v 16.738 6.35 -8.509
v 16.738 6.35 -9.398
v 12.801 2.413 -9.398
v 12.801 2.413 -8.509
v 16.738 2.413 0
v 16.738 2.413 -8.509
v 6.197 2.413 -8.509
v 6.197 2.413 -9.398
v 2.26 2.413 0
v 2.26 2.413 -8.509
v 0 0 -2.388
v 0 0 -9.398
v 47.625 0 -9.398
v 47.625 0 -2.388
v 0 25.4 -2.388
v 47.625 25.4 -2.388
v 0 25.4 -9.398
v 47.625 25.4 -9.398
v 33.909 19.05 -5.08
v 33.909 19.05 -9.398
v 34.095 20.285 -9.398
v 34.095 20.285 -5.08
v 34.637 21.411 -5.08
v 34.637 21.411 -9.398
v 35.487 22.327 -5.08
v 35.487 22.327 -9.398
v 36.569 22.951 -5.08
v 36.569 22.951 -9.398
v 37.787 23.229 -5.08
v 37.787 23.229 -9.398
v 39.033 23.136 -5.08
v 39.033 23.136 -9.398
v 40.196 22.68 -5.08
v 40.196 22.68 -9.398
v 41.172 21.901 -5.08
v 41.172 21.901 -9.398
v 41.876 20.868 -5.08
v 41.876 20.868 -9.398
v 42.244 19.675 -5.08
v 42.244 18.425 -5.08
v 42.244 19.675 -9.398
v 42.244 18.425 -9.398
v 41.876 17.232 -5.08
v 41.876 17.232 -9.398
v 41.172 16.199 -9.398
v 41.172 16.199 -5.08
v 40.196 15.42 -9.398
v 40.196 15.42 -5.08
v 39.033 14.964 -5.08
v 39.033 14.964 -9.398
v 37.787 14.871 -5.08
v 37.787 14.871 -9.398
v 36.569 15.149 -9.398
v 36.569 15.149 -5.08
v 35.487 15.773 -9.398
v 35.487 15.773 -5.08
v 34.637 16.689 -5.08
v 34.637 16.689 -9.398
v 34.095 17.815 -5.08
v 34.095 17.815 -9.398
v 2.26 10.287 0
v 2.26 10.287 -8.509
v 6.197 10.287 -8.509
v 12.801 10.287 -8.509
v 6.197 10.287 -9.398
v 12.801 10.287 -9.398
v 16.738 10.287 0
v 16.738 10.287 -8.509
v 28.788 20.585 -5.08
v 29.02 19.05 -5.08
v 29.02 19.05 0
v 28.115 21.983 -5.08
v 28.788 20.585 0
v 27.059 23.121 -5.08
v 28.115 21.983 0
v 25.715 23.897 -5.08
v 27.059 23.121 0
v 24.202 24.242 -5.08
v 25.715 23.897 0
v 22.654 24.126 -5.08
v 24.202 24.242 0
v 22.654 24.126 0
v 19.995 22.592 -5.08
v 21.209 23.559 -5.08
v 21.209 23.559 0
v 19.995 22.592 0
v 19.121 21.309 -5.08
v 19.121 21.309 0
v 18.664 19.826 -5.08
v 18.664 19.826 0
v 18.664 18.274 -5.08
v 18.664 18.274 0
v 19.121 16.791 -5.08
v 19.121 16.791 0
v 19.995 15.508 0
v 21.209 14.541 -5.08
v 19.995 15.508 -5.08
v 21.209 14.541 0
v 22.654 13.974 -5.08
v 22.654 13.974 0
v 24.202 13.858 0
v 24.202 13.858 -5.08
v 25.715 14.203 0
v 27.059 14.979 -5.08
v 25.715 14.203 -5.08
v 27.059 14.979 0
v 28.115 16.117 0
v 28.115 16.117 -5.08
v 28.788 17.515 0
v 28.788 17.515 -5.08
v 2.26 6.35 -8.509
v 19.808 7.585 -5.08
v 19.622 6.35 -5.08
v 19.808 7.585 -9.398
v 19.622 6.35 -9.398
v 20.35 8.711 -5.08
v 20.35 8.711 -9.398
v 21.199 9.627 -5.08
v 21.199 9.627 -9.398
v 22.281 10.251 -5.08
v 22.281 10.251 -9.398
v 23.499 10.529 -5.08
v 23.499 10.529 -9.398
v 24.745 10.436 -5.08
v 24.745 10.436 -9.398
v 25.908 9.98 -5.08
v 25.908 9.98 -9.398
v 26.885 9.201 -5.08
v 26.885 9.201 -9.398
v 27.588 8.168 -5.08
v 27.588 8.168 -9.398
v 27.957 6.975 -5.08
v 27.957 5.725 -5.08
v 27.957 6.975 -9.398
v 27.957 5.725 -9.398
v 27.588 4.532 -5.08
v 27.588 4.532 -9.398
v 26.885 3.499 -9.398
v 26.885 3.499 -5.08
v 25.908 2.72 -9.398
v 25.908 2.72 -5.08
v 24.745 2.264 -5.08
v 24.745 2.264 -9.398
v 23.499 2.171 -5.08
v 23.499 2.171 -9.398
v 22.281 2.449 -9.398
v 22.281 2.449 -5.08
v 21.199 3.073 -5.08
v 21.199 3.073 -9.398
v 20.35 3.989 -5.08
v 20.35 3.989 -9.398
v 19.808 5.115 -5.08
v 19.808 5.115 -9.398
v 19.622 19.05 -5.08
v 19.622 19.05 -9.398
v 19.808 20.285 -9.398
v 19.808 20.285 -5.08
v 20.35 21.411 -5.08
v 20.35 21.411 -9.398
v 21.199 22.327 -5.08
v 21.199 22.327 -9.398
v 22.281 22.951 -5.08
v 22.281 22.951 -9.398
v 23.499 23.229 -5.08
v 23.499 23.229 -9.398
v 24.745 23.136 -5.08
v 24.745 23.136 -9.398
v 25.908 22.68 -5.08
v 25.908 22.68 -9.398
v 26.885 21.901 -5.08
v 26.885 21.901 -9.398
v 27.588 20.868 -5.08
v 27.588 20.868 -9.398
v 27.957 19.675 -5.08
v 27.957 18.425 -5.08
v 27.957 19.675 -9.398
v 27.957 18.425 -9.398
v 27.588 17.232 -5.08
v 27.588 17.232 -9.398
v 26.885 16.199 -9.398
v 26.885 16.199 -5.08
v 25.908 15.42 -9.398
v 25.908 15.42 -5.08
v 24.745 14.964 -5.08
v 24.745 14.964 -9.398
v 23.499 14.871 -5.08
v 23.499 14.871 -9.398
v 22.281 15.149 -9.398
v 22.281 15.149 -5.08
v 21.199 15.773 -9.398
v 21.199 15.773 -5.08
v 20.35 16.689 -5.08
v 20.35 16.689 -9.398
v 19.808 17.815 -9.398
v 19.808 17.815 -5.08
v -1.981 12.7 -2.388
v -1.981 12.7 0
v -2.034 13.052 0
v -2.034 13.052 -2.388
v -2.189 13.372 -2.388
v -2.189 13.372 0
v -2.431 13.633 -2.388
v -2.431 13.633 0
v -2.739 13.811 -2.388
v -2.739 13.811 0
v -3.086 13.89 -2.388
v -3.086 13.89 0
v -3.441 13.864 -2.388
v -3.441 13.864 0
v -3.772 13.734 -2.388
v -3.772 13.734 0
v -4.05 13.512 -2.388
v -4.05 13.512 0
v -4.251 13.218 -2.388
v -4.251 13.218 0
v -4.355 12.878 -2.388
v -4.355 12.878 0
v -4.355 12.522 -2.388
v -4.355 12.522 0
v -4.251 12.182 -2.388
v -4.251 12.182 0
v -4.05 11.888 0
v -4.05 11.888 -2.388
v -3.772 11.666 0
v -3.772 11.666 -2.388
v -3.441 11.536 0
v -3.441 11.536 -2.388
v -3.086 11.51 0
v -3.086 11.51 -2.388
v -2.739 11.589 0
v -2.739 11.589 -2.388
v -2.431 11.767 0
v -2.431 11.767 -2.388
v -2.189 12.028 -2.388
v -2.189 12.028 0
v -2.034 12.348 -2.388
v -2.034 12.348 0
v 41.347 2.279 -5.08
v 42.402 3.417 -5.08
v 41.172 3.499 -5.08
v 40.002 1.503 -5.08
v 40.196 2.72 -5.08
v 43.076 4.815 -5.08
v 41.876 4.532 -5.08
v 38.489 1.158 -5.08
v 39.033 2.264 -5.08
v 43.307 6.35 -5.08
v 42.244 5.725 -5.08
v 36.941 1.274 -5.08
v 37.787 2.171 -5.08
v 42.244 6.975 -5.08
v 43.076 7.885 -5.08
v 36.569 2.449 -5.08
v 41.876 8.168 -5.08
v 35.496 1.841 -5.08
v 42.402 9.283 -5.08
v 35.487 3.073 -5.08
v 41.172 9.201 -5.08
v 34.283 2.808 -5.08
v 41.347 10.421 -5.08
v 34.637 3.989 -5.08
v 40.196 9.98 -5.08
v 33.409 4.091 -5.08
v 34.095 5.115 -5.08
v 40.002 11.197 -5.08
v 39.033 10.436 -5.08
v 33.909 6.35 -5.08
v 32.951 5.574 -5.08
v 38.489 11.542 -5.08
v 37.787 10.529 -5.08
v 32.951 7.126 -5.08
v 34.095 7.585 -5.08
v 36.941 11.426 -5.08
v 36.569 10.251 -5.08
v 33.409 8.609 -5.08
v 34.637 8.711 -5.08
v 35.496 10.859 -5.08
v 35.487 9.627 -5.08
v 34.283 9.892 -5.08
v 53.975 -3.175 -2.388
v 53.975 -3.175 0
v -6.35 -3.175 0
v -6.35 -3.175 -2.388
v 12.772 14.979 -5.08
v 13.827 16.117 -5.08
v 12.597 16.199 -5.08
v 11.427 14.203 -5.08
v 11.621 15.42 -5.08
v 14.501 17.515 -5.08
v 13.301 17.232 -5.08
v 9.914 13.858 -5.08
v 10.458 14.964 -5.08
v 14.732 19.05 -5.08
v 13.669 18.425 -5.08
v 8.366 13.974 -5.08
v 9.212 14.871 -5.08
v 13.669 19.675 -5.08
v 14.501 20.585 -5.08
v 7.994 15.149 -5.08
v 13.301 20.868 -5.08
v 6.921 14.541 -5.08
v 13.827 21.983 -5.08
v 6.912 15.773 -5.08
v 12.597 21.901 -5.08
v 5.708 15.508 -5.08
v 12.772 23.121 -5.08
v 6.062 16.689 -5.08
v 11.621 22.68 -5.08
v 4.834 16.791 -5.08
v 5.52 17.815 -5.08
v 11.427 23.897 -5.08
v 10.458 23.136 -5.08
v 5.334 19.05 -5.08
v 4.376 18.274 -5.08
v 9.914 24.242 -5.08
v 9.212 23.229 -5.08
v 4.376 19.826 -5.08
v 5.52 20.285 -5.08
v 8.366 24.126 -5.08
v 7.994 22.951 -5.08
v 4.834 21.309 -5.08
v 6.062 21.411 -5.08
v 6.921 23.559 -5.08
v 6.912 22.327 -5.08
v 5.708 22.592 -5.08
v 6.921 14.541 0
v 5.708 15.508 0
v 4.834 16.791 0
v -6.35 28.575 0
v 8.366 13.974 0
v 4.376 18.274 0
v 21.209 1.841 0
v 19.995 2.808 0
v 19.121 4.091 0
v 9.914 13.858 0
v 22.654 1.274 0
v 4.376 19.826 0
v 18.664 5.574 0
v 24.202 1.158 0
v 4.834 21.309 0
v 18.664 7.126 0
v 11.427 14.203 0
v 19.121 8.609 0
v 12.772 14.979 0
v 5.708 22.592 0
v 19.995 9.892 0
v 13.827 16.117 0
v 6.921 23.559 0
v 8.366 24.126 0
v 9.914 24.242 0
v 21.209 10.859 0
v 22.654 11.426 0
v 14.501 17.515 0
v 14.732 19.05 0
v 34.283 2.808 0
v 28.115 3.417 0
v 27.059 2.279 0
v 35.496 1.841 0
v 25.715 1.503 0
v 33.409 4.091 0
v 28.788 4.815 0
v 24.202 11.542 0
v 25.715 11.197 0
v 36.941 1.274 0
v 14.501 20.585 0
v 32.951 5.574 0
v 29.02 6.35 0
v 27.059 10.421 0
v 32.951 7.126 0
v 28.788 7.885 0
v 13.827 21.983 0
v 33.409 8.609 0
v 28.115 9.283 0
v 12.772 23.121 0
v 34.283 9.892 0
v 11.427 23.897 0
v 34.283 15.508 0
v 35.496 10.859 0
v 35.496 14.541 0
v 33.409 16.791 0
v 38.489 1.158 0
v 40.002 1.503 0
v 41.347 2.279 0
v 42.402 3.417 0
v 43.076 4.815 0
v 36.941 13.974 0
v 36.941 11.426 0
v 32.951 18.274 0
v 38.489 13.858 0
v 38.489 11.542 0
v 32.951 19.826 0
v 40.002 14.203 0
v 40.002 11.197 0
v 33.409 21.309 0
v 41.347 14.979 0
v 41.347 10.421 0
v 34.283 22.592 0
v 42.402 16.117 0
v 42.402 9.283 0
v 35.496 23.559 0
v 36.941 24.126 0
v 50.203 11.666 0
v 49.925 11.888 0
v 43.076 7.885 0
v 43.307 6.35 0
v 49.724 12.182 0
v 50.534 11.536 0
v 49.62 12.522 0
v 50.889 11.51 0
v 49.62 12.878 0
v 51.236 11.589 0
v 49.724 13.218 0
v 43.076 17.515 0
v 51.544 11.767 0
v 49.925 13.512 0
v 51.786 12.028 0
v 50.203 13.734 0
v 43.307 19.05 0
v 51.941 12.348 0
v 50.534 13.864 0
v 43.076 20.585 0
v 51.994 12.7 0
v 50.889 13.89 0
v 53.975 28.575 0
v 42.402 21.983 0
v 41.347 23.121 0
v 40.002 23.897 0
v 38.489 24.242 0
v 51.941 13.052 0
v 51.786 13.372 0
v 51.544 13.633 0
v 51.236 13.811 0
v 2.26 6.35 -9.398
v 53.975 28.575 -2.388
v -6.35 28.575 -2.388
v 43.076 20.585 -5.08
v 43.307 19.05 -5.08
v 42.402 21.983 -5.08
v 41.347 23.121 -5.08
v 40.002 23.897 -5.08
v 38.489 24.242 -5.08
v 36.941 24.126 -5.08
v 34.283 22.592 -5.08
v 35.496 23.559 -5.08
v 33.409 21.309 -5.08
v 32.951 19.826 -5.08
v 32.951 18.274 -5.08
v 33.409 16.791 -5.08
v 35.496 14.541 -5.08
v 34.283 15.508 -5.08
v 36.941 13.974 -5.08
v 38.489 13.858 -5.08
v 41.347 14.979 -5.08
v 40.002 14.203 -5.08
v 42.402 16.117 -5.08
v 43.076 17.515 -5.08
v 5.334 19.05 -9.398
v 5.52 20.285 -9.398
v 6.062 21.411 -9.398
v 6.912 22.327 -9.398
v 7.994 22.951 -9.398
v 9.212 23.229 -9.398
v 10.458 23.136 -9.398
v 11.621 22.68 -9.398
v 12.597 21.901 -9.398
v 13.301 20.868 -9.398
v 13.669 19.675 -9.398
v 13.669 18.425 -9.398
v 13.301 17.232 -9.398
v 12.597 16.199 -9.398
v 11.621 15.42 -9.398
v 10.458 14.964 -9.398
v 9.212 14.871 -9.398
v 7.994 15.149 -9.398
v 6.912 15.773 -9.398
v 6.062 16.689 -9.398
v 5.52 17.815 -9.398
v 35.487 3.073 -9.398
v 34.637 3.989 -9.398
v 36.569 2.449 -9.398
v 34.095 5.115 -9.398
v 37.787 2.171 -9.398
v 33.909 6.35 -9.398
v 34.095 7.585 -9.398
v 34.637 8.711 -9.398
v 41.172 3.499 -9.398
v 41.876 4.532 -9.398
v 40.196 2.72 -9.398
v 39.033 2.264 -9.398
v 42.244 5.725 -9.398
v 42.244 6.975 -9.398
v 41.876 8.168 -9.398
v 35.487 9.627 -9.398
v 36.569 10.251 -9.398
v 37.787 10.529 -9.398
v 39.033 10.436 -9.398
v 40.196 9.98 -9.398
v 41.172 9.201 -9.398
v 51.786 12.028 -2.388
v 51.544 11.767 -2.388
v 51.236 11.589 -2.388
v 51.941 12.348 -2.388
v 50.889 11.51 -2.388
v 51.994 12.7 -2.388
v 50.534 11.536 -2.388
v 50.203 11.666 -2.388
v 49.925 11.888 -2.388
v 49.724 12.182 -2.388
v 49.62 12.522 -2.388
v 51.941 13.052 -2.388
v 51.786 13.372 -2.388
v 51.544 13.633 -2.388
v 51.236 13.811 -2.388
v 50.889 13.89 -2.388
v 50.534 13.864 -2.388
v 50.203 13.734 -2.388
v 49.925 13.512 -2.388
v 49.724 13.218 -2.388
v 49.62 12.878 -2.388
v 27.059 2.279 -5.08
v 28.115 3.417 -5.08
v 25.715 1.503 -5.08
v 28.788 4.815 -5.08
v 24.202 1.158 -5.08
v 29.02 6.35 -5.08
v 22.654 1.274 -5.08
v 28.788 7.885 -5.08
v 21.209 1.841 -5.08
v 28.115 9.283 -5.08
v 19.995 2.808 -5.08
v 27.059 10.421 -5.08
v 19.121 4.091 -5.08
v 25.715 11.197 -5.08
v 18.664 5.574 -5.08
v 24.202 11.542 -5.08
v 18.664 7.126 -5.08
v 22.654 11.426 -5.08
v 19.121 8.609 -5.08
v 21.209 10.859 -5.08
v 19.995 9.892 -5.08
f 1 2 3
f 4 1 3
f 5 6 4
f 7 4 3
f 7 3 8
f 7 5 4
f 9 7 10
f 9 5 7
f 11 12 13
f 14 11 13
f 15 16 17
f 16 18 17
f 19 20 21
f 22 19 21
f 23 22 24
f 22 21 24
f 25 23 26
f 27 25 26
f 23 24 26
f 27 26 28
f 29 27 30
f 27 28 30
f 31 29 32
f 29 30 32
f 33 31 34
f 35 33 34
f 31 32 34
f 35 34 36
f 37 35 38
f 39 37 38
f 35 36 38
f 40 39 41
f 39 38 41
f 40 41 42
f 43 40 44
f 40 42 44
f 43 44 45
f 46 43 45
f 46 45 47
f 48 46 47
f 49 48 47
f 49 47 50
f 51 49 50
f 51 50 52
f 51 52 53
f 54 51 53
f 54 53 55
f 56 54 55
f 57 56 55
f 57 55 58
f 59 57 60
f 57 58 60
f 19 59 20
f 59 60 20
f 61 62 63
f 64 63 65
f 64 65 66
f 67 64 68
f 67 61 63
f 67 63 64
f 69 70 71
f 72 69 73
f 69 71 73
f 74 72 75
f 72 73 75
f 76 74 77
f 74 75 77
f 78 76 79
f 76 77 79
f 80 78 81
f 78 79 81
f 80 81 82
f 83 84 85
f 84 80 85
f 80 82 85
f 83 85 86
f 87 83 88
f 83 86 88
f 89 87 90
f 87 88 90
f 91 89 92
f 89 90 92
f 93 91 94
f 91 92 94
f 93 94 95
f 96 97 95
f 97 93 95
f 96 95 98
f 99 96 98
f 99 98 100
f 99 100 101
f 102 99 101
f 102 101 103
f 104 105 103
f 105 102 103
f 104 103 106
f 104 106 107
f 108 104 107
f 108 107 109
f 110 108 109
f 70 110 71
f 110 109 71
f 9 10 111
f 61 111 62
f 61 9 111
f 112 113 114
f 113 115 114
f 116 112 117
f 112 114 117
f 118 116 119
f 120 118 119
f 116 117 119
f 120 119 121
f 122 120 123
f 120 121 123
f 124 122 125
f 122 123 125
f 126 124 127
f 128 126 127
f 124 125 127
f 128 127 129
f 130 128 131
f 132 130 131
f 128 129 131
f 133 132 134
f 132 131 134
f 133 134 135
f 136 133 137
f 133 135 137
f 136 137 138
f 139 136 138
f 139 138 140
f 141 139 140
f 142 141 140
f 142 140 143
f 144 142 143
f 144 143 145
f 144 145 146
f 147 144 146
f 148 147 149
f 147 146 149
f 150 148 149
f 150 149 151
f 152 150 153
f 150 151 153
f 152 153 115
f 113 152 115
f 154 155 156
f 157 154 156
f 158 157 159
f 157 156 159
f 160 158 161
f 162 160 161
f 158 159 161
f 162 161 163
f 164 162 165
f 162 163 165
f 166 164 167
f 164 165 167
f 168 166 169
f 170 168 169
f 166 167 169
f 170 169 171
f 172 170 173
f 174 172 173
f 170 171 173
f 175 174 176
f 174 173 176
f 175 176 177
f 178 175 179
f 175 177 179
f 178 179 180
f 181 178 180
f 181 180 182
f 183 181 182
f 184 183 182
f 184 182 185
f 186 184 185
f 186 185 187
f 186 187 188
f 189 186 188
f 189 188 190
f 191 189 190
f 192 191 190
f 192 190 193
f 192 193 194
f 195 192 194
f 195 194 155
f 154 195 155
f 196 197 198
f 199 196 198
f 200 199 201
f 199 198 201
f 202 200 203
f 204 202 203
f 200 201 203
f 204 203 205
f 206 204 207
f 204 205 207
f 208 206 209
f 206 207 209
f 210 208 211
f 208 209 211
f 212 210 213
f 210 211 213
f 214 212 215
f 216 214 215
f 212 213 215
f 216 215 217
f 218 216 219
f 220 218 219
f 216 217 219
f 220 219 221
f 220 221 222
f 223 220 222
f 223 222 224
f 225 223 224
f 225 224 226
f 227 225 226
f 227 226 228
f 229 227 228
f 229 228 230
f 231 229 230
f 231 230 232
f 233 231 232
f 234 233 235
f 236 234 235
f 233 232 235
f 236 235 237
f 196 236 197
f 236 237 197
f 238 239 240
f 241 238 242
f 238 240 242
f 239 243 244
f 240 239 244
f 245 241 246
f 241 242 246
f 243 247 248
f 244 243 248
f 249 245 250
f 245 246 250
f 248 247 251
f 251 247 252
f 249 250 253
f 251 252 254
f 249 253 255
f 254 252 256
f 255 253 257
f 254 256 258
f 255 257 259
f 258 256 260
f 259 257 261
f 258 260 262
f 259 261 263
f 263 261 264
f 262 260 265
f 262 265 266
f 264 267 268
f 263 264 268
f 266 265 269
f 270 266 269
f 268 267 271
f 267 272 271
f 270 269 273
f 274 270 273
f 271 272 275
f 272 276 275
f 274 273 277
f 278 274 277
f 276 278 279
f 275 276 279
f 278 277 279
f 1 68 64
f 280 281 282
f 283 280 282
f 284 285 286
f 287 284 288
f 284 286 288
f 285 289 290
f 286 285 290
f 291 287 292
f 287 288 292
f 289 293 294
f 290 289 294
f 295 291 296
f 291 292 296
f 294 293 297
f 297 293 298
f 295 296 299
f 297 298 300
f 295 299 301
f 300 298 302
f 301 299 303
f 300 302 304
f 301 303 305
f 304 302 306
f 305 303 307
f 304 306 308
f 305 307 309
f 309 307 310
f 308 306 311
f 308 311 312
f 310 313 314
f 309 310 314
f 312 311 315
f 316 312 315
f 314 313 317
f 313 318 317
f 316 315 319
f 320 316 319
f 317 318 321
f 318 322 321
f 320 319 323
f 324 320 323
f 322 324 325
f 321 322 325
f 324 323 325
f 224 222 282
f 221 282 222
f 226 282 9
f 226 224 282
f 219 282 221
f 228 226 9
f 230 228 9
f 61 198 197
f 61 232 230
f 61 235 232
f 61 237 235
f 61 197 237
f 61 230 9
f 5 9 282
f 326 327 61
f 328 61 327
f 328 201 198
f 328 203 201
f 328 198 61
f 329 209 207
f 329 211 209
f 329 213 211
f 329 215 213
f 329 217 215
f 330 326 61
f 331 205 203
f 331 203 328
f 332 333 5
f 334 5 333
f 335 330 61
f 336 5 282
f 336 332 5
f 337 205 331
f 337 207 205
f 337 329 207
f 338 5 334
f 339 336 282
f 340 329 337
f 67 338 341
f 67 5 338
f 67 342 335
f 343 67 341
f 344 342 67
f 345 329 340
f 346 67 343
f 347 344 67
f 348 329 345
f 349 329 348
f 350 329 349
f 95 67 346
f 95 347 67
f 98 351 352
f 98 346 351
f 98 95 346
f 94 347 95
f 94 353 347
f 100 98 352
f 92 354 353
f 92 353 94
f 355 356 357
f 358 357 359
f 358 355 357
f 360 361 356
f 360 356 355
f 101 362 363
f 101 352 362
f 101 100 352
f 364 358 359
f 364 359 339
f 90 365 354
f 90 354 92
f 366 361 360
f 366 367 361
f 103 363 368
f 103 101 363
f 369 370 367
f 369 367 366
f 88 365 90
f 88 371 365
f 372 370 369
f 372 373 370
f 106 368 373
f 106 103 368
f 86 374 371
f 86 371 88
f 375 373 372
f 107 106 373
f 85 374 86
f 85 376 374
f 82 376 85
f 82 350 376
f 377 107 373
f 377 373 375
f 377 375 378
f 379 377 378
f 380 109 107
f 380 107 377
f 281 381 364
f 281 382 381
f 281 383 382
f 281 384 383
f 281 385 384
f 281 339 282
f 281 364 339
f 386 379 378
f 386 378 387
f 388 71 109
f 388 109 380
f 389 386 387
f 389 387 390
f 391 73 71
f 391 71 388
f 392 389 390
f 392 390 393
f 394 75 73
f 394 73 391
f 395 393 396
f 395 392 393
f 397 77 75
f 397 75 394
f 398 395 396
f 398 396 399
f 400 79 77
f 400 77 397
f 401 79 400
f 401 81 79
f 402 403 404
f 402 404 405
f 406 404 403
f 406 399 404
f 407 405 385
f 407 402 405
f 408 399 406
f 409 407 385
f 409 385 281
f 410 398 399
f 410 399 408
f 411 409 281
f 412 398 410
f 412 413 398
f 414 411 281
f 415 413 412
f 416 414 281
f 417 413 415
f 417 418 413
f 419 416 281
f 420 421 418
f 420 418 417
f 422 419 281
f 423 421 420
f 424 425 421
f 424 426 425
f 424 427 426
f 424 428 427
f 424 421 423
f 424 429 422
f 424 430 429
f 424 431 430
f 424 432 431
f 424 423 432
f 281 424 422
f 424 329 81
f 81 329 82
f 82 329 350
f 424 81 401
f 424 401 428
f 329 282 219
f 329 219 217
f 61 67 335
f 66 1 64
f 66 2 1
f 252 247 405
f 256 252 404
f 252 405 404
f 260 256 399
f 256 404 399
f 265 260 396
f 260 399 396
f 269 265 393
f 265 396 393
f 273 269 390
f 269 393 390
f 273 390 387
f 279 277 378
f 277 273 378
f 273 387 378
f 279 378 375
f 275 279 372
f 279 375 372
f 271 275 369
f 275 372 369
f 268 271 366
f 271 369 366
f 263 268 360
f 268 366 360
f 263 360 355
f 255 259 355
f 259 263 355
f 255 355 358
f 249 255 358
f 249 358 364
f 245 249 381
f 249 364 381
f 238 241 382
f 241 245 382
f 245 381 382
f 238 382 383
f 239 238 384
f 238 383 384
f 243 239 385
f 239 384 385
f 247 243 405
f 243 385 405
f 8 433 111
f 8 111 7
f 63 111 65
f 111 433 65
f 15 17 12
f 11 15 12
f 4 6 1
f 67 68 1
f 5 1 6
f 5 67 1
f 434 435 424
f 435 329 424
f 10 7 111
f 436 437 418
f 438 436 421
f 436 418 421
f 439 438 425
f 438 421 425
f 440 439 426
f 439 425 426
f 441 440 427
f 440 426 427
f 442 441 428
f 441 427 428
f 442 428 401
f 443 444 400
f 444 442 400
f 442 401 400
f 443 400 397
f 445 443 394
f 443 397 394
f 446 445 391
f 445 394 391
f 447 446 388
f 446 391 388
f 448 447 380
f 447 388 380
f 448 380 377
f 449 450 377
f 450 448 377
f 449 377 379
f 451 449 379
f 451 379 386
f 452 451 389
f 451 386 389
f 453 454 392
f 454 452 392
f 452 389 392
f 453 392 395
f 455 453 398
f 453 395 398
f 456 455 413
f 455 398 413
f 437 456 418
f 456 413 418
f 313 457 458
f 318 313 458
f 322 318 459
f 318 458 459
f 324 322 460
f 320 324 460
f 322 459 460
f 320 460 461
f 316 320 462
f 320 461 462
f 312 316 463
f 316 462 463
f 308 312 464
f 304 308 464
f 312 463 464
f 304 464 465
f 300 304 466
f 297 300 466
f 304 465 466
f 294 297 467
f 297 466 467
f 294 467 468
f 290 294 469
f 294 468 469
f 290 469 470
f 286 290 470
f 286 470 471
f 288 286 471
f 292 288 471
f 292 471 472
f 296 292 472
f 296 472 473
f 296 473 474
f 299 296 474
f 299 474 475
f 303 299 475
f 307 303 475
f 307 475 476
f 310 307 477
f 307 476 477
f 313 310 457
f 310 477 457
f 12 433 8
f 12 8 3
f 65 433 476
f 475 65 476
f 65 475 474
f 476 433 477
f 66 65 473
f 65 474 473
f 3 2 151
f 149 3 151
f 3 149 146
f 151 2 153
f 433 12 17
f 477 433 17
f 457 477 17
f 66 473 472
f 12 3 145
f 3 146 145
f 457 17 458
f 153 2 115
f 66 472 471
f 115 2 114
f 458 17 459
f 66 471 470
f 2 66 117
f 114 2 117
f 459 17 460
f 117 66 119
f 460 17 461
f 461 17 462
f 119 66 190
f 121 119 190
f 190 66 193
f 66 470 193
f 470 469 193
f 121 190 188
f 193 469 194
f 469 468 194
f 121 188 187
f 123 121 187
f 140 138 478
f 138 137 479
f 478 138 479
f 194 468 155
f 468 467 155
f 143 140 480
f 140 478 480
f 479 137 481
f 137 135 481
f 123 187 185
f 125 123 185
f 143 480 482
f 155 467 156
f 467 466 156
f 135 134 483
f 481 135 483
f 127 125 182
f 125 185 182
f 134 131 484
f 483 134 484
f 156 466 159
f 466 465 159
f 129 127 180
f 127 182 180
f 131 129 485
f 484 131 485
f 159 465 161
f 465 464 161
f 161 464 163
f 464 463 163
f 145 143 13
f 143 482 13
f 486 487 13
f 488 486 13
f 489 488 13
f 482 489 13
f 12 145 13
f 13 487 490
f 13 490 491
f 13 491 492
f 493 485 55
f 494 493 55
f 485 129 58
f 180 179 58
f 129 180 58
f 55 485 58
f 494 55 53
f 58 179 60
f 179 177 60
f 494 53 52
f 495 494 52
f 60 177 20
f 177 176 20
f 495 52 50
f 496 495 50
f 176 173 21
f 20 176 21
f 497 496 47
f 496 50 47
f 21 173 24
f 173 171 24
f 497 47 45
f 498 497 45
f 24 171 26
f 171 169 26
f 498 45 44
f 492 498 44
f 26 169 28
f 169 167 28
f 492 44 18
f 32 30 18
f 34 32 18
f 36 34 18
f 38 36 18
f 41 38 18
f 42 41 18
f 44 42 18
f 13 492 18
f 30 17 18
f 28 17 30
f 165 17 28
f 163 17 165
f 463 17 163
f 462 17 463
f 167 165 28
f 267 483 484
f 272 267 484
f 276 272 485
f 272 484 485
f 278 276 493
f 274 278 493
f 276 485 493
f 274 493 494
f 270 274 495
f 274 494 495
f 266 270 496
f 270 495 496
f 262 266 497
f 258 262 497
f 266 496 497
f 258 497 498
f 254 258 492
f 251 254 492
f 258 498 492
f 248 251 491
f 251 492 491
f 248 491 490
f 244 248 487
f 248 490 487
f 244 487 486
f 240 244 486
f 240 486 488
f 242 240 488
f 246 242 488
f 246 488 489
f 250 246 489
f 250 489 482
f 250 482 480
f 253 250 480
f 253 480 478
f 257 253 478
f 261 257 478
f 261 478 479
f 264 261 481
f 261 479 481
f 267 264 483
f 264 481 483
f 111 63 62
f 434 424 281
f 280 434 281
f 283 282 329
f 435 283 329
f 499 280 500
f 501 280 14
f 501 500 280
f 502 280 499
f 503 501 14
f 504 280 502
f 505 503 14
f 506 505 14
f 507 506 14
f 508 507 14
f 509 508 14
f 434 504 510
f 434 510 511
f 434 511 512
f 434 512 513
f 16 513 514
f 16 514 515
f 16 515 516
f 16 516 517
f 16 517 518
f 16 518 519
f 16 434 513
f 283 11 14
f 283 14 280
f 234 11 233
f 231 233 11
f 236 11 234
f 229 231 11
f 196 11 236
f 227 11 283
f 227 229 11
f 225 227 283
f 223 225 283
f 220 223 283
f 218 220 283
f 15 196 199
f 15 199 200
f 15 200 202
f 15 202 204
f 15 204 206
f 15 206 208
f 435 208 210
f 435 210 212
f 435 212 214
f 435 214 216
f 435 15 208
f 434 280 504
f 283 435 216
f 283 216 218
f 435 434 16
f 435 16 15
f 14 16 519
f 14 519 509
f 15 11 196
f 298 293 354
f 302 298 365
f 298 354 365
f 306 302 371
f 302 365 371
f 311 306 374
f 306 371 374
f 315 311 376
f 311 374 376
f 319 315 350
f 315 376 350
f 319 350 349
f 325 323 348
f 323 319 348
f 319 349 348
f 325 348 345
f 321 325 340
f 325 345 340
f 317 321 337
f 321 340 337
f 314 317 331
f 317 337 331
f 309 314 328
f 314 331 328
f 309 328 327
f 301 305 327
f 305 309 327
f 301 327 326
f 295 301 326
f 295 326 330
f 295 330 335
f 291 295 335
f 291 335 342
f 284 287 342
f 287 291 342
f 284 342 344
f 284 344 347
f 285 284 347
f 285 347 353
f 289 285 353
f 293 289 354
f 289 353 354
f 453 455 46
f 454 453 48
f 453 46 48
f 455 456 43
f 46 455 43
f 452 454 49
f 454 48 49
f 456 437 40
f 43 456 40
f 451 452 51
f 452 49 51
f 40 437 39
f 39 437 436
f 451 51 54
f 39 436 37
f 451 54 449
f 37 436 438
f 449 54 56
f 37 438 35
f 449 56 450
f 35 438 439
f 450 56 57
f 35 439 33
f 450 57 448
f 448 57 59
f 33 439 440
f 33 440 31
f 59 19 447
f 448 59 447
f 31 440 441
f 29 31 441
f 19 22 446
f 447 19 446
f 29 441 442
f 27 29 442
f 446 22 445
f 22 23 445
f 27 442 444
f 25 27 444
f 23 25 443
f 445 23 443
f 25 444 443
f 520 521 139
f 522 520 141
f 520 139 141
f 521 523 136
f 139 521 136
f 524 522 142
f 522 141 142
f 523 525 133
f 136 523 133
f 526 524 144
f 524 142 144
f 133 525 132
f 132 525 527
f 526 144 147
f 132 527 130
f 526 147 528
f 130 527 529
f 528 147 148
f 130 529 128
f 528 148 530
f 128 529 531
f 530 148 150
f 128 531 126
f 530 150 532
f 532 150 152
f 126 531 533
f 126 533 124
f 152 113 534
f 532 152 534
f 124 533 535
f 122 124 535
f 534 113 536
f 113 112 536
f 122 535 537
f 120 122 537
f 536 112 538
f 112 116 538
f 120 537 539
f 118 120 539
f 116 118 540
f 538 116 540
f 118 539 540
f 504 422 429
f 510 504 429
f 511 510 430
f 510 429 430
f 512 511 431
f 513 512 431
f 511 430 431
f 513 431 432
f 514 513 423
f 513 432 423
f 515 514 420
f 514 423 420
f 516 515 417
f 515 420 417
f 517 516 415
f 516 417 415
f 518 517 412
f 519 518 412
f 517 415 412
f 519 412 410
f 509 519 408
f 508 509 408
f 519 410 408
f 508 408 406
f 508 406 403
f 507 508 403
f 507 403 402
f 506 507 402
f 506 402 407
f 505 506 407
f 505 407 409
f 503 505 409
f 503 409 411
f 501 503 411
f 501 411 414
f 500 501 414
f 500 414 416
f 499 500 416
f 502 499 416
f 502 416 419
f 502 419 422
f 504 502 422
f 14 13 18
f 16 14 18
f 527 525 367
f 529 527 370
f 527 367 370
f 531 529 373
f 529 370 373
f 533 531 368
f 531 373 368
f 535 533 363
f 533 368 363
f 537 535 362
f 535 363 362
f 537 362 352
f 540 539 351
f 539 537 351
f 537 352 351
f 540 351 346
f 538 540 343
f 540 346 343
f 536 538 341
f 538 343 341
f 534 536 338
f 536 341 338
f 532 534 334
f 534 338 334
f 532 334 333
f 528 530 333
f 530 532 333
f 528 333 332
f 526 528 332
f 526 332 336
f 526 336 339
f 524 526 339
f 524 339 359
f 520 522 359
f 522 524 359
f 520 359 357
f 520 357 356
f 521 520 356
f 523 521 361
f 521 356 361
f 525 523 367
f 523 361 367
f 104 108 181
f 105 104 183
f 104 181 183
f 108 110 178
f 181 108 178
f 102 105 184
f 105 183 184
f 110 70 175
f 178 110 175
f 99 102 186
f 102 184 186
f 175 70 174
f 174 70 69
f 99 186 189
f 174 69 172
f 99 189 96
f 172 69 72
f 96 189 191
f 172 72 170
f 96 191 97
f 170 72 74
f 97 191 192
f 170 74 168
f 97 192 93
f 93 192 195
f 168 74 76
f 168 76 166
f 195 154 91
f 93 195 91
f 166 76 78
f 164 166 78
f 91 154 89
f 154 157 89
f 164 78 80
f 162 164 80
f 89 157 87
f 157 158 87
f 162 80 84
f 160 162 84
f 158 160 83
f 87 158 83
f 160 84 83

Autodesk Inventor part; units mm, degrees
ref_plane "YZ Plane" through (0, 0, 0) normal (1, 0, 0) x (0, 1, 0)
ref_plane "XZ Plane" through (0, 0, 0) normal (0, 1, 0) x (-1, 0, 0)
ref_plane "XY Plane" through (0, 0, 0) normal (0, 0, 1) x (1, 0, 0)
sketch "Sketch1" plane through (0, 0, 0) normal (0, 0, 1) x (1, 0, 0)
  line L0 (0, 0) -> (47.625, 0)
  line L1 (47.625, 0) -> (47.625, 25.4)
  line L2 (47.625, 25.4) -> (0, 25.4)
  line L3 (0, 25.4) -> (0, 0)
  circle A0 centre (38.1, 6.35) radius 5.207
  circle A1 centre (23.8125, 6.35) radius 5.207
  circle A2 centre (23.8125, 19.05) radius 5.207
  circle A3 centre (38.1, 19.05) radius 5.207
  circle A4 centre (9.525, 19.05) radius 5.207
  line L4 (2.2603, 10.287) -> (16.7383, 10.287)
  line L5 (16.7383, 10.287) -> (16.7383, 2.413)
  line L6 (16.7383, 2.413) -> (2.2603, 2.413)
  line L7 (2.2603, 2.413) -> (2.2603, 10.287)
  line L8 (-6.35, 28.575) -> (53.975, 28.575)
  line L9 (53.975, 28.575) -> (53.975, -3.175)
  line L10 (53.975, -3.175) -> (-6.35, -3.175)
  line L11 (-6.35, -3.175) -> (-6.35, 28.575)
  dimension "d0" = 47.625
  dimension "d1" = 25.4
  dimension "d2" = 10.414
  dimension "d3" = 10.414
  dimension "d4" = 10.414
  dimension "d5" = 10.414
  dimension "d6" = 10.414
  dimension "d9" = 14.478
  dimension "d10" = 7.874
  dimension "d27" = 60.325
  dimension "d28" = 31.75
extrude "Extrusion1" add sketch "Sketch1" against normal blind 9.398 contours L3 L2 L1 L0 | L8 L9 L10 L11
sketch "Sketch3" plane through (0, 0, -9.398) normal (0, 0, -1) x (-1, 0, 0)
  line L0 (6.35, 28.575) -> (-53.975, 28.575) projected
  line L1 (-53.975, 28.575) -> (-53.975, -3.175) projected
  line L2 (-53.975, -3.175) -> (6.35, -3.175) projected
  line L3 (6.35, -3.175) -> (6.35, 28.575) projected
  line L4 (-47.625, 25.4) -> (0, 25.4)
  line L5 (0, 25.4) -> (0, 0)
  line L6 (0, 0) -> (-47.625, 0)
  line L7 (-47.625, 0) -> (-47.625, 25.4)
extrude "Extrusion2" cut sketch "Sketch3" against normal blind 7.0104
sketch "Sketch4" plane through (0, 0, -9.398) normal (0, 0, -1) x (-1, 0, 0)
  circle A0 centre (-9.525, 19.05) radius 5.207 projected
  circle A1 centre (-38.1, 19.05) radius 5.207 projected
  circle A2 centre (-23.8125, 19.05) radius 5.207 projected
  circle A3 centre (-23.8125, 6.35) radius 5.207 projected
  circle A4 centre (-38.1, 6.35) radius 5.207 projected
  circle A5 centre (-38.1, 19.05) radius 4.191
  circle A6 centre (-23.8125, 19.05) radius 4.191
  circle A7 centre (-9.525, 19.05) radius 4.191
  circle A8 centre (-38.1, 6.35) radius 4.191
  circle A9 centre (-23.8125, 6.35) radius 4.191
  dimension "d17" = 8.382
extrude "Extrusion3" add sketch "Sketch4" against normal blind 4.318
sketch "Sketch5" plane through (0, 0, -9.398) normal (0, 0, -1) x (-1, 0, 0)
  line L0 (-2.2603, 10.287) -> (-2.2603, 2.413) projected
  line L1 (-2.2603, 2.413) -> (-16.7383, 2.413) projected
  line L2 (-16.7383, 2.413) -> (-16.7383, 10.287) projected
  line L3 (-16.7383, 10.287) -> (-2.2603, 10.287) projected
  line L4 (-16.7383, 6.35) -> (-12.8013, 10.287)
  line L5 (-16.7383, 6.35) -> (-11.1705, 6.35) construction
  line L6 (-16.7383, 6.35) -> (-12.8013, 2.413)
  line L7 (-2.2603, 6.35) -> (-6.1973, 10.287)
  line L8 (-2.2603, 6.35) -> (-6.1973, 2.413)
  dimension "d20" = 45
extrude "Extrusion4" add sketch "Sketch5" against normal blind 0.889 contours L0 L7 L3 | L0 L1 L8 | L4 L2 L3 | L1 L2 L6
sketch "Sketch6" plane through (0, 0, 0) normal (0, 0, 1) x (1, 0, 0)
  circle A0 centre (-3.175, 12.7) radius 1.1938
  circle A1 centre (50.8, 12.7) radius 1.1938
  point P0 (0, 0)
  dimension "d23" = 2.3876
  dimension "d24" = 2.3876
extrude "Extrusion5" cut sketch "Sketch6" against normal blind 2.3876
properties part number "5 led mount idea"
